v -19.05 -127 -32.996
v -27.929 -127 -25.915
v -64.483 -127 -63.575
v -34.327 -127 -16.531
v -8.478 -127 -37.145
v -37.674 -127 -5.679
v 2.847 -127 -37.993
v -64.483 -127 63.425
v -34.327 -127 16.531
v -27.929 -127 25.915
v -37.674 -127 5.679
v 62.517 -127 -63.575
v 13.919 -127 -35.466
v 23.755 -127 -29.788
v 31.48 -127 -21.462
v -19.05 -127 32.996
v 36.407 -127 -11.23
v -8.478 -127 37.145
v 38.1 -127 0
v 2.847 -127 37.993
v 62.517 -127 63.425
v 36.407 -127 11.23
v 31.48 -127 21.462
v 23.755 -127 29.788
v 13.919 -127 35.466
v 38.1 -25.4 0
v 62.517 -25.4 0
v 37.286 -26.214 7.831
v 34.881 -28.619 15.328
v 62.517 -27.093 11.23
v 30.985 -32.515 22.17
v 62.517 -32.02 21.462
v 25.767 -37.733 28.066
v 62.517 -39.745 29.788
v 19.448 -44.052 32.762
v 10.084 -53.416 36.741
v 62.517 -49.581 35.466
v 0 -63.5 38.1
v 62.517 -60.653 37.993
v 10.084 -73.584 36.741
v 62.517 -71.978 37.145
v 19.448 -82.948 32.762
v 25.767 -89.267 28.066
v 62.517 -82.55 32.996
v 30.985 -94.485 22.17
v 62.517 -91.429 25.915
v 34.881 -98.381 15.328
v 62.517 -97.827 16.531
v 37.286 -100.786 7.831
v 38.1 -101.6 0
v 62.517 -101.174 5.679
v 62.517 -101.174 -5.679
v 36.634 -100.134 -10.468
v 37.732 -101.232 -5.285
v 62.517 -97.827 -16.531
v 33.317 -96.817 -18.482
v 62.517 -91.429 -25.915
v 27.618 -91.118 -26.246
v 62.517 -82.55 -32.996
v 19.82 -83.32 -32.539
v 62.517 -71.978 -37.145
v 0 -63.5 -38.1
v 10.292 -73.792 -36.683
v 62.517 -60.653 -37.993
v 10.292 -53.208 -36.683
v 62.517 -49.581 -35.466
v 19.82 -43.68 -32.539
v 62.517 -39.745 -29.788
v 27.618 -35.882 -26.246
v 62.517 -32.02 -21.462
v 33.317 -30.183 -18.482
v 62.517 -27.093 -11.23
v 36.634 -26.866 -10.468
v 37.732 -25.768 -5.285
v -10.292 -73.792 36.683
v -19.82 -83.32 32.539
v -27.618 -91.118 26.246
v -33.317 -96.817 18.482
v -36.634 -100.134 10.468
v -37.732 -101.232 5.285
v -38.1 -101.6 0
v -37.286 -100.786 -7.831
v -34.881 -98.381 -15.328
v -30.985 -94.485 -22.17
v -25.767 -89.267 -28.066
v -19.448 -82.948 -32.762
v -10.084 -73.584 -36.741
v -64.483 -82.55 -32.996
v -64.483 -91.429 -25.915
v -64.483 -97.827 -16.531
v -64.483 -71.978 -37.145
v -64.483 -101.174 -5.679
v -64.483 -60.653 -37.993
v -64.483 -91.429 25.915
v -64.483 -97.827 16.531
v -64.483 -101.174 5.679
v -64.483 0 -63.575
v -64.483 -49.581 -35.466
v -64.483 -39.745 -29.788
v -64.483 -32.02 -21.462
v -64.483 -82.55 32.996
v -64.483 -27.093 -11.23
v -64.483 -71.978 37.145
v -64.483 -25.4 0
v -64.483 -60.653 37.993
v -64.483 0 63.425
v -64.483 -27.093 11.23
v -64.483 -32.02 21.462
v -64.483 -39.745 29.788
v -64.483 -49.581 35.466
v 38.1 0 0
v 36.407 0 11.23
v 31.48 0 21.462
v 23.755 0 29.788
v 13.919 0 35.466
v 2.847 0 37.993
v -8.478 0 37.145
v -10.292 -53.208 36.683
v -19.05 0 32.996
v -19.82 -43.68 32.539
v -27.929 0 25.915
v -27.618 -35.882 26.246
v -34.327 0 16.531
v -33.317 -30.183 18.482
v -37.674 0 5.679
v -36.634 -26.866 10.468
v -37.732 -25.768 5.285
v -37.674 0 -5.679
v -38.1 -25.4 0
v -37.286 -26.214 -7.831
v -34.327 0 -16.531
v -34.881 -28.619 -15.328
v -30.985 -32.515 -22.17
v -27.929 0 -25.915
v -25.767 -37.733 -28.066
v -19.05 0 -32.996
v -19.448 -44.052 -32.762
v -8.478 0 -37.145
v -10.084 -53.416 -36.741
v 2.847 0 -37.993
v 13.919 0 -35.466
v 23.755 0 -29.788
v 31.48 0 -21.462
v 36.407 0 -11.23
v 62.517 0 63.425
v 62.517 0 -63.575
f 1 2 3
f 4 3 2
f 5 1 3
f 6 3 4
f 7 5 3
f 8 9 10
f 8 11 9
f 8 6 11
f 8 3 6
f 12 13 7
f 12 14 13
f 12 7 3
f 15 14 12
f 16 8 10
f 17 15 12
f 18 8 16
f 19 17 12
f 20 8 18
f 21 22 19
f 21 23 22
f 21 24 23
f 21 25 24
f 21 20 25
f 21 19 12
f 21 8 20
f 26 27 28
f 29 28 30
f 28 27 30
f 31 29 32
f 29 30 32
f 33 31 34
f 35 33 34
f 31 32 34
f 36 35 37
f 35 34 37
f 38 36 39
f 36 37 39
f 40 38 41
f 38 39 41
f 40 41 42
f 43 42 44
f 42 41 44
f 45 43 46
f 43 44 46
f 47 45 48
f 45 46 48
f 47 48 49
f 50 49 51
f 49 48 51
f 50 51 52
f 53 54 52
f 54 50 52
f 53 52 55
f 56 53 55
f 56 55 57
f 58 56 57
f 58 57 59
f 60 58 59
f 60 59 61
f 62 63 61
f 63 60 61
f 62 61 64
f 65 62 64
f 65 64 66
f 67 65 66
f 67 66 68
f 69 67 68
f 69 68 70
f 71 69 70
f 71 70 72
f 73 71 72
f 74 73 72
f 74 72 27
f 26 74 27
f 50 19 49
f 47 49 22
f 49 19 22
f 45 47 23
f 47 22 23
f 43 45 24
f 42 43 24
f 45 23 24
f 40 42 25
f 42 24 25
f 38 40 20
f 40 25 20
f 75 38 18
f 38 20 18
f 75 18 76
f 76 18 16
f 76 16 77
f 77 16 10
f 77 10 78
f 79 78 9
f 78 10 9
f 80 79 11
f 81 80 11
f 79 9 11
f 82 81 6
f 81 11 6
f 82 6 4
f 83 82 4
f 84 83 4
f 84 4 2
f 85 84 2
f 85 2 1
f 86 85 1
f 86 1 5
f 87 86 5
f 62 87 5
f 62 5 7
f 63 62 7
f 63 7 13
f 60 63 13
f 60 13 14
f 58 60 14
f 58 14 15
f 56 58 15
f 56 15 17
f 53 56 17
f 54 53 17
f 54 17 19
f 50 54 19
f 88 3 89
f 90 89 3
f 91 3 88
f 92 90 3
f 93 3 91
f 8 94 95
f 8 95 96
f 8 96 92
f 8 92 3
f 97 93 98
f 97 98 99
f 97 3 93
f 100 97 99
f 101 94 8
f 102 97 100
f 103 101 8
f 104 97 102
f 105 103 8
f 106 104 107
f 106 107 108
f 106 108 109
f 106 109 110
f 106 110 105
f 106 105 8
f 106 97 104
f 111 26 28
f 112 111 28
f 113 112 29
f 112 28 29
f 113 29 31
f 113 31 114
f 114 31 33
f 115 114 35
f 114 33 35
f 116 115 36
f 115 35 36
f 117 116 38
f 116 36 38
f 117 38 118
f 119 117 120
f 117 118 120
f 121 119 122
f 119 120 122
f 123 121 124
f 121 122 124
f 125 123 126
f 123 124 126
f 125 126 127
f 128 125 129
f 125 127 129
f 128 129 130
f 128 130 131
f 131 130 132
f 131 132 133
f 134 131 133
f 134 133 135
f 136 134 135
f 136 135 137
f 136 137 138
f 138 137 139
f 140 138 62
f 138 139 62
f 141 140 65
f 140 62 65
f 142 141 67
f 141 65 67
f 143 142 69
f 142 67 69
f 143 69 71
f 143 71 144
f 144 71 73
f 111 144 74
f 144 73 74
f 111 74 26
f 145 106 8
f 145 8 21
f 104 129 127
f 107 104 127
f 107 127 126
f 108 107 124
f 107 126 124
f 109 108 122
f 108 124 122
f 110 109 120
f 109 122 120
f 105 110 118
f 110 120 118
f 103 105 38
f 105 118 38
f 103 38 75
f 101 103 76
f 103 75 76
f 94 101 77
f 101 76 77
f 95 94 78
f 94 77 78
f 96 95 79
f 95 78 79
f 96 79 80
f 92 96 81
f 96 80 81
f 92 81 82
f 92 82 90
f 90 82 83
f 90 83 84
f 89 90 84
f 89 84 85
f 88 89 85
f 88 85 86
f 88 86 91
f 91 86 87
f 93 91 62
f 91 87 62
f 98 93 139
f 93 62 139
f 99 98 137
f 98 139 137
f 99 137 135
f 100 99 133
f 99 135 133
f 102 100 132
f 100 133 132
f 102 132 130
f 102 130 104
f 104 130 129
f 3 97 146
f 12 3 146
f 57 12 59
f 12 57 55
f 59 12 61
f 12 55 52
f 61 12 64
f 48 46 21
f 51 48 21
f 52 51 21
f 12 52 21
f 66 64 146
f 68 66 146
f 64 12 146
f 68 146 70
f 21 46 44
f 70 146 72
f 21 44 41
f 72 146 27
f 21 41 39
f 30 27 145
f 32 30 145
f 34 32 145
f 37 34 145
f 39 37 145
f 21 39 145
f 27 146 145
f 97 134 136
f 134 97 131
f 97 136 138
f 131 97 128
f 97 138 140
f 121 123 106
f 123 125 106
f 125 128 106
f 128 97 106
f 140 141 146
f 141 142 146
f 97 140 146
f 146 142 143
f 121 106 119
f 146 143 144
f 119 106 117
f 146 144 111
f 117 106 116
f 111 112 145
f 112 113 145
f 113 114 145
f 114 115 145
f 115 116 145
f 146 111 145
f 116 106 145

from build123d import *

# Parameters (mm, degrees)
F0_W     = 127
F0_H     = 127
F1_DEPTH = 127
F2_R     = 38.1
F3_DEPTH = 127.001
F4_R     = 38.1
F5_DEPTH = 127.001


with BuildPart() as f1:
    # F0 (on Front) → F1 (new body)
    with BuildSketch(Plane.XZ):
        with Locations((-0.983404, -0.074951)):
            Rectangle(F0_W, F0_H)
    extrude(amount=F1_DEPTH)

    # F2 (on face) → F3 (cut, through all)
    with BuildSketch(Plane.XZ.offset(127)):
        Circle(F2_R)
    extrude(amount=-F3_DEPTH, mode=Mode.SUBTRACT)

    # F4 (on face) → F5 (cut, through all)
    with BuildSketch(Plane.YZ.offset(62.516596)):
        with Locations((-63.5, 0)):
            Circle(F4_R)
    extrude(amount=-F5_DEPTH, mode=Mode.SUBTRACT)


solid = f1.part
